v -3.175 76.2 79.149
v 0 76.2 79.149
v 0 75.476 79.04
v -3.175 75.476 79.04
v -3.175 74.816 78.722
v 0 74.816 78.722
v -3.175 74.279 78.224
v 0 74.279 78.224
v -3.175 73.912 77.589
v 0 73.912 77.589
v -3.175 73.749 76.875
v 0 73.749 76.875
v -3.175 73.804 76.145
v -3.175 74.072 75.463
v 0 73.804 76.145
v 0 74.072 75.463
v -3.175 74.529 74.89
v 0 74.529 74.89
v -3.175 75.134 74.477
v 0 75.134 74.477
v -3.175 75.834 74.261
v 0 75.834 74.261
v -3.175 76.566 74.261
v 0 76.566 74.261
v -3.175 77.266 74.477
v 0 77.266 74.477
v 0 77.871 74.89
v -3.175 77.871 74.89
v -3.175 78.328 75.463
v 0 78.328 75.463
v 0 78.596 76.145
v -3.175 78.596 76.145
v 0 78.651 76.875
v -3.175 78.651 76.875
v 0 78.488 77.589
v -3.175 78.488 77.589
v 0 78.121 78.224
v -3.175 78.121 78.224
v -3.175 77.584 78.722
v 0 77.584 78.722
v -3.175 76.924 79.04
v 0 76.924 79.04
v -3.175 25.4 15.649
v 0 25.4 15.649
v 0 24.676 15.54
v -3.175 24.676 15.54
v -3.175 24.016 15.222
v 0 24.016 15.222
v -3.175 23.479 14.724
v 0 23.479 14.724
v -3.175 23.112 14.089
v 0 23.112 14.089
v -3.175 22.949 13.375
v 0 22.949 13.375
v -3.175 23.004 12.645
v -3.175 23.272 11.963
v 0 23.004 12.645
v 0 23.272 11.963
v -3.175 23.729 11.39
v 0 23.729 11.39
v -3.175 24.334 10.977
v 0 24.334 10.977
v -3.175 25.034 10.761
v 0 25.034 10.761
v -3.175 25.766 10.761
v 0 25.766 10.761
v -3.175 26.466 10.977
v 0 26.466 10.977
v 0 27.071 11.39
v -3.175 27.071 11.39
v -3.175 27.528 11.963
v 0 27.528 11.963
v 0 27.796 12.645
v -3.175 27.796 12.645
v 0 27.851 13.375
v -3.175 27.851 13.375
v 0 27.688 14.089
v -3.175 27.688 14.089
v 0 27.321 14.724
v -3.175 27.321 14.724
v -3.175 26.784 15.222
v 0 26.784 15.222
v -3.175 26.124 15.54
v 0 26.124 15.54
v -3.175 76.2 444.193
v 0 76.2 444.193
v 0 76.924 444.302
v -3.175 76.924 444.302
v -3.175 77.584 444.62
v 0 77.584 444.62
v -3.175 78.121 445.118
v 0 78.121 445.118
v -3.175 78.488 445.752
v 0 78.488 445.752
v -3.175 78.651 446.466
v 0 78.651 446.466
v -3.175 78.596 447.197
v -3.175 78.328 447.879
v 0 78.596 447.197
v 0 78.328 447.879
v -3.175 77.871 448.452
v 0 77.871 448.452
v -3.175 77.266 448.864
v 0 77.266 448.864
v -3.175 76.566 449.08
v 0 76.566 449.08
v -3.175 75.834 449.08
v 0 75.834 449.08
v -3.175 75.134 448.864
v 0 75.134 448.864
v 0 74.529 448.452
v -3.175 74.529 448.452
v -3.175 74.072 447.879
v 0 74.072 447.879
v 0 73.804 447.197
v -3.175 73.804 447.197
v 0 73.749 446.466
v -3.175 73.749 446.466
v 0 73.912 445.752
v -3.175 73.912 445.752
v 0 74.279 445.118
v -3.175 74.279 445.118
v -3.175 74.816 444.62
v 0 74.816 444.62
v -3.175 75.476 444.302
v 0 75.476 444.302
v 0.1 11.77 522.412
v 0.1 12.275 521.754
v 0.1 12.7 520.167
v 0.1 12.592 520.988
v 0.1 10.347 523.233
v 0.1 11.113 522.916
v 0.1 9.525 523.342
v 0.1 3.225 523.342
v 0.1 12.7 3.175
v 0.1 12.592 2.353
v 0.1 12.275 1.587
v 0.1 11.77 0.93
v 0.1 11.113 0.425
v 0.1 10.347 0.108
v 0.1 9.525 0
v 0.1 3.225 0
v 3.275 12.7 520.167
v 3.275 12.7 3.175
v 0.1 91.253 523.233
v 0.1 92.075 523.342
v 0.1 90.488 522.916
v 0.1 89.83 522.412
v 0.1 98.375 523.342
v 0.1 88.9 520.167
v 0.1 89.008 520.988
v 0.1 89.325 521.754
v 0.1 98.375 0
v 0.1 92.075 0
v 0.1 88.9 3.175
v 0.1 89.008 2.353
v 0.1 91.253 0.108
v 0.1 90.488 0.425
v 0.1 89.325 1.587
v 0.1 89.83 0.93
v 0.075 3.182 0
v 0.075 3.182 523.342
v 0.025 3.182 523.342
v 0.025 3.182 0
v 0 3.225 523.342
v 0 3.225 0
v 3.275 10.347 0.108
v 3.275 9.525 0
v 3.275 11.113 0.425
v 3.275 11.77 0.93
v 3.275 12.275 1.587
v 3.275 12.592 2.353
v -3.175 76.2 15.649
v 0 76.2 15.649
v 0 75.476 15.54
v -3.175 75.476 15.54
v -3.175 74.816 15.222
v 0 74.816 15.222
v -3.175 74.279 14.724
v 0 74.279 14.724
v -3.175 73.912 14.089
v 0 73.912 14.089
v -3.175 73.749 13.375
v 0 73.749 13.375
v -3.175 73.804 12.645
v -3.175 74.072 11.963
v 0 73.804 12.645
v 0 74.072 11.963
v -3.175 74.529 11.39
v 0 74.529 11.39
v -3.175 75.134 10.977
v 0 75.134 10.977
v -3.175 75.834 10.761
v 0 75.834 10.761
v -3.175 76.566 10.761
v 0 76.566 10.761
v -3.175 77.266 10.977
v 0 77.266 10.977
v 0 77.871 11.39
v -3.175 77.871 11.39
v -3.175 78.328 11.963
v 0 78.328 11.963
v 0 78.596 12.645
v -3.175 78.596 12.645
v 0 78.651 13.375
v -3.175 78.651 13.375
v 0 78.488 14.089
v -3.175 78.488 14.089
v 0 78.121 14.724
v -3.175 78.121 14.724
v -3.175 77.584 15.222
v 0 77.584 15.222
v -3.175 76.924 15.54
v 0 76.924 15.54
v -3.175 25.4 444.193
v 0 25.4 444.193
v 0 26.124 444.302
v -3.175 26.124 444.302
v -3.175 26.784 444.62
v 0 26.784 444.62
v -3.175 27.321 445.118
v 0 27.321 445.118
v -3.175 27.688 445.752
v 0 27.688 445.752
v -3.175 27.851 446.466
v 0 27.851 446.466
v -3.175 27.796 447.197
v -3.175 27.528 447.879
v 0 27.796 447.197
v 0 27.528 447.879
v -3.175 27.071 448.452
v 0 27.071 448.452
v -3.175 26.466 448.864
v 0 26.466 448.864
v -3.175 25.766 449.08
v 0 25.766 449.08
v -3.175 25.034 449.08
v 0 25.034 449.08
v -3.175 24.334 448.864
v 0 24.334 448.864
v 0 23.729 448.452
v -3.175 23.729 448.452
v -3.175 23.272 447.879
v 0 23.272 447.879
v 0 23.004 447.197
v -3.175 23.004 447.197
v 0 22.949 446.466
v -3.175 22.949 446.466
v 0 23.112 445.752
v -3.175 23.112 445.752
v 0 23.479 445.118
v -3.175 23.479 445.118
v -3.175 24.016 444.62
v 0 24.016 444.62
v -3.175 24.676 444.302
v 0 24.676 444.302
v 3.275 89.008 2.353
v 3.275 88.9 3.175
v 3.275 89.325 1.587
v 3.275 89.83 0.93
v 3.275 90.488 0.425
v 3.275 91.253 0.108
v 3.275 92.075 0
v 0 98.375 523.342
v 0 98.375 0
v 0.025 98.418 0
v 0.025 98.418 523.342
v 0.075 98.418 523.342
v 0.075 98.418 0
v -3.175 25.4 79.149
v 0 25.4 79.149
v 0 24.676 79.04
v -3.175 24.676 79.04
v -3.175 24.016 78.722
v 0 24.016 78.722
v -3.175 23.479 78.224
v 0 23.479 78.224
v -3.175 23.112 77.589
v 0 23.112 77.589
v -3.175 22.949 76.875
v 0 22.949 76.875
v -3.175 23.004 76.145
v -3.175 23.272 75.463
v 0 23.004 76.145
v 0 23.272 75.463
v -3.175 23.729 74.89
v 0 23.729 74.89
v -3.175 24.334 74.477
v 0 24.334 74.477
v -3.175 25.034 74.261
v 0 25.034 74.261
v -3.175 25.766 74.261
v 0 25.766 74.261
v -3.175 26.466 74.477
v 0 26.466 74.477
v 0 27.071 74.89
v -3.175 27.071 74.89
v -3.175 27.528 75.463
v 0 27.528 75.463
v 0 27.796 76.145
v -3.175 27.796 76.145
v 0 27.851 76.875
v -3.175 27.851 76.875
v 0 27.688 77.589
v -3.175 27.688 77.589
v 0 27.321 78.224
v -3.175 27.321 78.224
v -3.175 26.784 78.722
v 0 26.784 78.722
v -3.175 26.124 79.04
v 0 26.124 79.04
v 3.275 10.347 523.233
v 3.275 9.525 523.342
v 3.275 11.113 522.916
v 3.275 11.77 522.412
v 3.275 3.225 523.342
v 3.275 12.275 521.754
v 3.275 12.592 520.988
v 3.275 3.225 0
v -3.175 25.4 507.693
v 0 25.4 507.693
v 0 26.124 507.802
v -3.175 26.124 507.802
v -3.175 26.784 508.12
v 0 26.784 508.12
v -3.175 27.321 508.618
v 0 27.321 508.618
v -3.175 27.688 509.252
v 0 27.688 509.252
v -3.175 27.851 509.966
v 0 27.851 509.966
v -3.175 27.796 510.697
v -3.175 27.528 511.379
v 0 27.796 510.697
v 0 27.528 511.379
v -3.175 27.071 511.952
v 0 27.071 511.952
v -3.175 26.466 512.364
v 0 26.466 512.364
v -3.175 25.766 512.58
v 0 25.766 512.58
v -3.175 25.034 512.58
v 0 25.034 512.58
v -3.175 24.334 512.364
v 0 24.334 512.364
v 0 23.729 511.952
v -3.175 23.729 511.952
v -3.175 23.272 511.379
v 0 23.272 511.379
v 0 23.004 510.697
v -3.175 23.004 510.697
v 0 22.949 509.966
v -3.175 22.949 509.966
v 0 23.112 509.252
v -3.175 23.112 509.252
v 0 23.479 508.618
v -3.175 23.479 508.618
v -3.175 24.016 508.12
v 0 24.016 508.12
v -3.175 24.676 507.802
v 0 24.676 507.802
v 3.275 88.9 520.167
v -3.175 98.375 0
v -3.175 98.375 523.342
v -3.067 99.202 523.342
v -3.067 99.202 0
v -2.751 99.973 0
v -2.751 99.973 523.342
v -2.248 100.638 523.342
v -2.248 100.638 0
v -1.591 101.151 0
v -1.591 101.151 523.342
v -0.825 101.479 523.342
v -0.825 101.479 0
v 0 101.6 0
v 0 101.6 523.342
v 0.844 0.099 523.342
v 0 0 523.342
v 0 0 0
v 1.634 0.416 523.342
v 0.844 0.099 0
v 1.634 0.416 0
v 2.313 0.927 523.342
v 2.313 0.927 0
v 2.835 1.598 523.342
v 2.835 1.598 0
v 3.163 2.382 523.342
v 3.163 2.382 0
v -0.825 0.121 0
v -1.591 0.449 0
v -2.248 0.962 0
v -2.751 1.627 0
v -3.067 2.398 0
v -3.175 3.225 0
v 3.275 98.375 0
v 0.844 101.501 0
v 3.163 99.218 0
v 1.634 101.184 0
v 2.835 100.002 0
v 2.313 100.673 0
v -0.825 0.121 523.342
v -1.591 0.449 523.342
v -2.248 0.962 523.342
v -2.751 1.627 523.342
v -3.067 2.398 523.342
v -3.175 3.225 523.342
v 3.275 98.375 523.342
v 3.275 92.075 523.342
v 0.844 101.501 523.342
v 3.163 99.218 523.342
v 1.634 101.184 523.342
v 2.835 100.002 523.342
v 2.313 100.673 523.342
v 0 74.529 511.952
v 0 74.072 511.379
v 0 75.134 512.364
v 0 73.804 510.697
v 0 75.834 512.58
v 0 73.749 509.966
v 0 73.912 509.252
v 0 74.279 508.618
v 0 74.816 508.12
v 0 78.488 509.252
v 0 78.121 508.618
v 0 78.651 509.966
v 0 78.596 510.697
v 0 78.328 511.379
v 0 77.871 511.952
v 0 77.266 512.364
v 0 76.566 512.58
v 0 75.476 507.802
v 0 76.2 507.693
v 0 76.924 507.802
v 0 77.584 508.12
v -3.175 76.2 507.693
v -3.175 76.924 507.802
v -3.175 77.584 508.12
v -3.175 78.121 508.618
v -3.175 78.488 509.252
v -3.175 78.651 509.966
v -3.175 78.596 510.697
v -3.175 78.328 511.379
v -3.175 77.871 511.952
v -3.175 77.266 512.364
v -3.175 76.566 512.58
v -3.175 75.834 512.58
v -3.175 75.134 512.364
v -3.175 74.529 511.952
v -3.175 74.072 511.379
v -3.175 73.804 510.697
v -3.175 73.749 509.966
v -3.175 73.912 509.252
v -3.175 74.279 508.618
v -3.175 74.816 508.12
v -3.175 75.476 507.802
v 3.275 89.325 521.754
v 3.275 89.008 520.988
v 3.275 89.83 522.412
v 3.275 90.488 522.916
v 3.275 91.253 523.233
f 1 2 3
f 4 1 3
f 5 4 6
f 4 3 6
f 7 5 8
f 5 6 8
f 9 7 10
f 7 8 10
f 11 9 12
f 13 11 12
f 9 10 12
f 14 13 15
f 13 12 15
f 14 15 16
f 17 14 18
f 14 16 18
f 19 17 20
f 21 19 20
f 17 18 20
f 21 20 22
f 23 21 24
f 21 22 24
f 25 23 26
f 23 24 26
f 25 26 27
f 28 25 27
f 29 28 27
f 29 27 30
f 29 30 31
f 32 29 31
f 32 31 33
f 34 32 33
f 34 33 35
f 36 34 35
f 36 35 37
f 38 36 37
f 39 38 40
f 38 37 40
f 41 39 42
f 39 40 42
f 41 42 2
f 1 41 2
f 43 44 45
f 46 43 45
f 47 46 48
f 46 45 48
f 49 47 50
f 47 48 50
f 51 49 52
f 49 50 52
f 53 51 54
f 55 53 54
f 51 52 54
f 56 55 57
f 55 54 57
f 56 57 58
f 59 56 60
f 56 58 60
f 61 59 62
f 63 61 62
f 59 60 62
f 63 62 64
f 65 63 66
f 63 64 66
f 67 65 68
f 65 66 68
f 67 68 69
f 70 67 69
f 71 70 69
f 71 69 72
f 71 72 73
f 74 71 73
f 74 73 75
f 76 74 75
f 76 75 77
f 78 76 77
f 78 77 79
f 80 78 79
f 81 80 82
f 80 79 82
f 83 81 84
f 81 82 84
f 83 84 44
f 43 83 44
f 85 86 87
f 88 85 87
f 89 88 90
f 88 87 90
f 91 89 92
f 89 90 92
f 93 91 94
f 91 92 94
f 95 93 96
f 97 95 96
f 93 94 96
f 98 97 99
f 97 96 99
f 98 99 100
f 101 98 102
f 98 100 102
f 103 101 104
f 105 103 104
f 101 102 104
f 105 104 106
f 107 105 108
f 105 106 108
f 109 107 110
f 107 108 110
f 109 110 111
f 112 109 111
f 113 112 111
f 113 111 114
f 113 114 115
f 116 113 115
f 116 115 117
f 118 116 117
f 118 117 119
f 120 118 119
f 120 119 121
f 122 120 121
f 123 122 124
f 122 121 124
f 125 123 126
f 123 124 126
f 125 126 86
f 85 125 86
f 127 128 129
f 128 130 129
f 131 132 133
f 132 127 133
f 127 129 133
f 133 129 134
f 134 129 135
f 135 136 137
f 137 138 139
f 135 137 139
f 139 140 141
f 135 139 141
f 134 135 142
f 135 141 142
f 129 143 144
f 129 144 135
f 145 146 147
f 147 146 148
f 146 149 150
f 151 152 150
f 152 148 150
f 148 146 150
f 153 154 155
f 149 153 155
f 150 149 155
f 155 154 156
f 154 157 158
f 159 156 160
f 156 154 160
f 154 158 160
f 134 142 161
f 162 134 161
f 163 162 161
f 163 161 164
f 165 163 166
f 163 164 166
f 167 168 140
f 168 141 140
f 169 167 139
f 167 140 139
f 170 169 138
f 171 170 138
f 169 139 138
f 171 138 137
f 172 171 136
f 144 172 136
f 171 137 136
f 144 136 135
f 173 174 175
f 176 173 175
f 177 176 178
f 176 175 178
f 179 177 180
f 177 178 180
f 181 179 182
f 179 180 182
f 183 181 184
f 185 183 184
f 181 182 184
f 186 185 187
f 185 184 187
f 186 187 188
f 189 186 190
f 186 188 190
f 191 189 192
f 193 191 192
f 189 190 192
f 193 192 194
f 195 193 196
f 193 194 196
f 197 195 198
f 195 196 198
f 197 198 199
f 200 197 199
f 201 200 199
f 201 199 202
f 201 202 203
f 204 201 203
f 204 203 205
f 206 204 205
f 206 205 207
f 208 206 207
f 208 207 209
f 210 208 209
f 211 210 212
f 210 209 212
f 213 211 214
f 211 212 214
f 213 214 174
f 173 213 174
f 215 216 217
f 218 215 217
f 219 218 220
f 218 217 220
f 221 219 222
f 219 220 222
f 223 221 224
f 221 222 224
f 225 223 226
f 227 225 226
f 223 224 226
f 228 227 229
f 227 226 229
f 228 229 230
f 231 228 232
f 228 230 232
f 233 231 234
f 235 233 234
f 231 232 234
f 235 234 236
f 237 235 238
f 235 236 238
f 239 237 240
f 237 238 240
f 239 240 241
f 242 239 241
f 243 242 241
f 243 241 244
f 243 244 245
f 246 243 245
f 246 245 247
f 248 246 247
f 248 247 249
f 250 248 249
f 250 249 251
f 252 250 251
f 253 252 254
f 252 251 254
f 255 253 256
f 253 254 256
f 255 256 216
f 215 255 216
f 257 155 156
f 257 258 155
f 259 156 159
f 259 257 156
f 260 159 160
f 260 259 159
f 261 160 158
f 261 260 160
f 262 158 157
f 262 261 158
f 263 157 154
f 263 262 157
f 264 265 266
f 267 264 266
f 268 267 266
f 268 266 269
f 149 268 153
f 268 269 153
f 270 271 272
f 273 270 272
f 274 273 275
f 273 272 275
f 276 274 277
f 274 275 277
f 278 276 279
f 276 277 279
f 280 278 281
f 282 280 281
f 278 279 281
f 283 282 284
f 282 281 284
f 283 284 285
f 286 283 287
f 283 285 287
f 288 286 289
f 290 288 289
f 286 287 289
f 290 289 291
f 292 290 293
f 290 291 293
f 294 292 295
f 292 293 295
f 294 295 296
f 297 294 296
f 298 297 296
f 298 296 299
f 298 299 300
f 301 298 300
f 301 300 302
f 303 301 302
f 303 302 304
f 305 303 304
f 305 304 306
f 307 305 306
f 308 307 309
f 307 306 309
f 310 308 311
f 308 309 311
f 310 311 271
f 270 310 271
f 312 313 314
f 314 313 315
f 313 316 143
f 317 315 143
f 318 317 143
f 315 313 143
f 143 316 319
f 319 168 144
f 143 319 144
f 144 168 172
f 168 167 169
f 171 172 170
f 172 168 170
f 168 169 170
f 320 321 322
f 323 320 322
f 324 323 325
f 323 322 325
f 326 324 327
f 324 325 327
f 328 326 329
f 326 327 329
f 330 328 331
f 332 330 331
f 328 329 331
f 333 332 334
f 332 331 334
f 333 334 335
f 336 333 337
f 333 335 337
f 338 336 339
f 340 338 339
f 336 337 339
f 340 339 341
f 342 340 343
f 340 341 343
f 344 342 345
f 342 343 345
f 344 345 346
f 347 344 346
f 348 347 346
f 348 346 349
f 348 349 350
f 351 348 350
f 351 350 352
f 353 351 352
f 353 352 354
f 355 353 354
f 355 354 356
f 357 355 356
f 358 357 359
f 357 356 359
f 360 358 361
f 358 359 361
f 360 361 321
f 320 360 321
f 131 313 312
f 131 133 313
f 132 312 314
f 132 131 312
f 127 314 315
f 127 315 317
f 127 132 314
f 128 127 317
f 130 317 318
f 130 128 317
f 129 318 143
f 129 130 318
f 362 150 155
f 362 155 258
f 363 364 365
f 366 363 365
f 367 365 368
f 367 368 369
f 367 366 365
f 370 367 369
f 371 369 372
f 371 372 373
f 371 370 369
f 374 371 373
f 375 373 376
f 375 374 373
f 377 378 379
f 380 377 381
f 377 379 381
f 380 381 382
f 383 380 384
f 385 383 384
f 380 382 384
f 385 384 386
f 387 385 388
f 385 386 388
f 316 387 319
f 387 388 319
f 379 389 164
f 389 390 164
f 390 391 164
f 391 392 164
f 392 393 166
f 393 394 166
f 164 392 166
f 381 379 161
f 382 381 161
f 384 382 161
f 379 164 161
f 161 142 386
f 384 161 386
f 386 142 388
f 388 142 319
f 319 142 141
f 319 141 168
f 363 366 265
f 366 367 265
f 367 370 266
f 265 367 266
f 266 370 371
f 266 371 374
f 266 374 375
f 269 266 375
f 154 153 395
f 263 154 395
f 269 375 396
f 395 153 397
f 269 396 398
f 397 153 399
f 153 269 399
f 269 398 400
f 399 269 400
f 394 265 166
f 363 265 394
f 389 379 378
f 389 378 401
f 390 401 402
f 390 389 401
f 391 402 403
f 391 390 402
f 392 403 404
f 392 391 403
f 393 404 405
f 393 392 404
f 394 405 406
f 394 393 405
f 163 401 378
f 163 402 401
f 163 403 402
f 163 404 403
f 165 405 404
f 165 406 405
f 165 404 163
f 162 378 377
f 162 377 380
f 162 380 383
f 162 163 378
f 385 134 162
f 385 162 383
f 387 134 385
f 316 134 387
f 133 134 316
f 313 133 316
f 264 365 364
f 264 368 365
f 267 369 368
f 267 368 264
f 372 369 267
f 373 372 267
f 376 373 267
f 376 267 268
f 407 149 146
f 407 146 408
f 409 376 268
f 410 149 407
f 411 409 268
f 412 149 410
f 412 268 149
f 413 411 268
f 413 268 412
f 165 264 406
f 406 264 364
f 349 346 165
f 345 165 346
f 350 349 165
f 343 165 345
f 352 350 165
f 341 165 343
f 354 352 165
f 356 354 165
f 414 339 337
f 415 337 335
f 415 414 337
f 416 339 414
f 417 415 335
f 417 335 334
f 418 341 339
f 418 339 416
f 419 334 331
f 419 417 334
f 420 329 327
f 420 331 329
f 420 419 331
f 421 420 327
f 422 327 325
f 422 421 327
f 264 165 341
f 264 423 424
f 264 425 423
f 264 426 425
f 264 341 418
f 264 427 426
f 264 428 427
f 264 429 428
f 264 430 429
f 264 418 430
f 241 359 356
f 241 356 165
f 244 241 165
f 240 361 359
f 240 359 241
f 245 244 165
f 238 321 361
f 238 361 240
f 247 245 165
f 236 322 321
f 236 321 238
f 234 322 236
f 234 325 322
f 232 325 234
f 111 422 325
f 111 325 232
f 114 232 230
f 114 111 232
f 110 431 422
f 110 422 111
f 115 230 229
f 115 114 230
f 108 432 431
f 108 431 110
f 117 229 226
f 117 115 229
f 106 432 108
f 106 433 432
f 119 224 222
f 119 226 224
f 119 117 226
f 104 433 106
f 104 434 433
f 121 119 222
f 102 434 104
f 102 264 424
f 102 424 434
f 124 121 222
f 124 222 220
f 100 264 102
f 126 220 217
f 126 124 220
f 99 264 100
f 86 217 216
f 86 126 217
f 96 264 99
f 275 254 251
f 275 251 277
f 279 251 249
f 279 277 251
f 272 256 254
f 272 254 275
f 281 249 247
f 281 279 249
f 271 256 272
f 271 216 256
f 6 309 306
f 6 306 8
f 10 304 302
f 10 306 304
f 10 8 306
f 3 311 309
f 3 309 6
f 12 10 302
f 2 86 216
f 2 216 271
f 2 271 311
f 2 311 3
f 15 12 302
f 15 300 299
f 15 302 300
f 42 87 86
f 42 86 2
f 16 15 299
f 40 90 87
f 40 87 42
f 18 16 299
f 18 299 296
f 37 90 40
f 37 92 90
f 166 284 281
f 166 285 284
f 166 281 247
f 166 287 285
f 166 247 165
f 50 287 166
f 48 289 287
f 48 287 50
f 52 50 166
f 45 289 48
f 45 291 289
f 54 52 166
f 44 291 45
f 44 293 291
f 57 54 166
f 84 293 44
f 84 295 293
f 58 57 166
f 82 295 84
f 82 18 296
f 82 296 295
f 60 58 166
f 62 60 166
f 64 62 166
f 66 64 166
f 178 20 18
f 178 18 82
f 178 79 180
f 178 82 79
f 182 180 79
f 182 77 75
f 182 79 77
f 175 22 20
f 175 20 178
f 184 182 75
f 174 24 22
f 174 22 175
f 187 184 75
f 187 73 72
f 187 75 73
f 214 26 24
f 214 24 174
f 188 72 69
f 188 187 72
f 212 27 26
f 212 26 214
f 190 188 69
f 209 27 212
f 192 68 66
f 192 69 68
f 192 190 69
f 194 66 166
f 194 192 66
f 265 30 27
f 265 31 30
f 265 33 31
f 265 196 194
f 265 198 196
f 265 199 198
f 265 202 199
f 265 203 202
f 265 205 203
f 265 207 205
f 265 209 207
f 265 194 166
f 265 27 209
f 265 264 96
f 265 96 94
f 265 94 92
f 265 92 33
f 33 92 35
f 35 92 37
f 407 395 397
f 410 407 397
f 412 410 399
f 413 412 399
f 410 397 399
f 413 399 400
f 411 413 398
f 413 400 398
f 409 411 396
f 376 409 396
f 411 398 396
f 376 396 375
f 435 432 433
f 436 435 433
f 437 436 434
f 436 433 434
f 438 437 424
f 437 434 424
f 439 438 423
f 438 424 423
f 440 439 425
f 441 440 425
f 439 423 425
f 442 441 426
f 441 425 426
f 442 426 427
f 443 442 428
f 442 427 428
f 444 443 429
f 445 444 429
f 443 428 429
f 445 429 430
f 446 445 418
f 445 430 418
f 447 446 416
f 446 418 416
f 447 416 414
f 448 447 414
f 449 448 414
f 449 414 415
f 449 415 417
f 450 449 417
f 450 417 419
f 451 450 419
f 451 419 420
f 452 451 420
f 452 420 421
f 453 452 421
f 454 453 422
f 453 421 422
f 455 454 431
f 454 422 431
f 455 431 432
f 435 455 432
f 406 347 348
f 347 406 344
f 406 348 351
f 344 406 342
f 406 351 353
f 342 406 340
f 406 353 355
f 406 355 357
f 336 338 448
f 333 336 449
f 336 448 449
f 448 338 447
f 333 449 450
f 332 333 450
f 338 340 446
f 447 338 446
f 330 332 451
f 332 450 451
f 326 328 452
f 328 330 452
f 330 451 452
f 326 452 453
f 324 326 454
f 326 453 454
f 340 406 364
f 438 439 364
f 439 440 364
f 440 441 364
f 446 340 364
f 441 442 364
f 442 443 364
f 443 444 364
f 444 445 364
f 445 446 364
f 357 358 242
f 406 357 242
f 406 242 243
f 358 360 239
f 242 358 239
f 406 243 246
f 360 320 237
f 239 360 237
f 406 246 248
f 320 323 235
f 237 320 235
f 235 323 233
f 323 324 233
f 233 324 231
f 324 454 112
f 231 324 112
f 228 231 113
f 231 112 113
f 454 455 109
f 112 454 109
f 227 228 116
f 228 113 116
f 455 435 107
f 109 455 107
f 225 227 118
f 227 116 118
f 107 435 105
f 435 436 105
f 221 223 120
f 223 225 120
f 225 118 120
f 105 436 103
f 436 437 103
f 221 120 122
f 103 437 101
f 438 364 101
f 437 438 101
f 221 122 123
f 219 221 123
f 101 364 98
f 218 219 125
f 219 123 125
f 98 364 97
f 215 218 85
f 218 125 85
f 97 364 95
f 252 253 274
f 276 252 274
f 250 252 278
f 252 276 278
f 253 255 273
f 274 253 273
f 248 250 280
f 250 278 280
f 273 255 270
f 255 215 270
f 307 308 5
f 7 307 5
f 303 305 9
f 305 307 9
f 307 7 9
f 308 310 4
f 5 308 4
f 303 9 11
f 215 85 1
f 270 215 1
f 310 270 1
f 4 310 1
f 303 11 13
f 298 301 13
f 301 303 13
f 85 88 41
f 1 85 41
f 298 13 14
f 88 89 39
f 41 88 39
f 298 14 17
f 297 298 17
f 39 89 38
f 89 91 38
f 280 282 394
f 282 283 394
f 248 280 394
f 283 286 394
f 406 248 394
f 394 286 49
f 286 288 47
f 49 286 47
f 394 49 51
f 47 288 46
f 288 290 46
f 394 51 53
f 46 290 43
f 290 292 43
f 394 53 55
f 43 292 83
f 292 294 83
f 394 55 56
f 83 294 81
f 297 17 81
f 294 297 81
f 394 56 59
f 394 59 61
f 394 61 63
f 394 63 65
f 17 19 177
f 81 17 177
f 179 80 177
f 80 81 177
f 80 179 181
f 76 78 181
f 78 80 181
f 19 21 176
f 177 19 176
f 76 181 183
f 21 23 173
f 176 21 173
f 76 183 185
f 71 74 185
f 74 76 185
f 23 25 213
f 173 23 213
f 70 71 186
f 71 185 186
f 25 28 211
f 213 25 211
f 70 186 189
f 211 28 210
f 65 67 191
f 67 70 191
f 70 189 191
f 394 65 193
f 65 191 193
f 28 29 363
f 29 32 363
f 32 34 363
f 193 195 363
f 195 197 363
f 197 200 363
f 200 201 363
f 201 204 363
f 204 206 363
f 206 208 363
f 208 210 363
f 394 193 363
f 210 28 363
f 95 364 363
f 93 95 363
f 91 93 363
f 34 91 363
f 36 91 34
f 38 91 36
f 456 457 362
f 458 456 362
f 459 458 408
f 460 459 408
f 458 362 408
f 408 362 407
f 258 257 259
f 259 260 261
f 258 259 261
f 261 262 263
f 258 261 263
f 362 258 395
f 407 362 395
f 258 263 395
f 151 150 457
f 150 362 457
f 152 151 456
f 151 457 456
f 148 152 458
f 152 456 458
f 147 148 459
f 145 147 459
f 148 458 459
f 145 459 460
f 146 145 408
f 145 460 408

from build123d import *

# Parameters (mm, degrees)
SKETCH1_W          = 523.3416
SKETCH1_H          = 101.6
SKETCH1_R          = 2.45745
BASE_FLANGE1_DEPTH = 3.175
HEM1_DEPTH         = 523.3416
HEM1_2_DEPTH       = 523.3416
FILLET1_R          = 3.175


# Read off the part's stored shape, not the designer's step: Hem1
# Sheet-metal steps are written as plain solids
with BuildPart() as part:
    # Sketch1 → Base-Flange1 (new body)
    with BuildSketch(Plane(origin=(0, 0, 0), x_dir=(0, 0, -1), z_dir=(1, 0, 0))):
        with Locations((-261.6708, 50.8)):
            Rectangle(SKETCH1_W, SKETCH1_H)
        with Locations((-510.15011, 76.2)):
            Circle(SKETCH1_R, mode=Mode.SUBTRACT)
        with Locations((-446.65011, 76.2)):
            Circle(SKETCH1_R, mode=Mode.SUBTRACT)
        with Locations((-446.65011, 25.4)):
            Circle(SKETCH1_R, mode=Mode.SUBTRACT)
        with Locations((-510.15011, 25.4)):
            Circle(SKETCH1_R, mode=Mode.SUBTRACT)
        with Locations(Location((-76.69149, 76.2, 0), (0, 0, 180))):
            Circle(SKETCH1_R, mode=Mode.SUBTRACT)
        with Locations(Location((-76.69149, 25.4, 0), (0, 0, 180))):
            Circle(SKETCH1_R, mode=Mode.SUBTRACT)
        with Locations(Location((-13.19149, 25.4, 0), (0, 0, 180))):
            Circle(SKETCH1_R, mode=Mode.SUBTRACT)
        with Locations(Location((-13.19149, 76.2, 0), (0, 0, 180))):
            Circle(SKETCH1_R, mode=Mode.SUBTRACT)
    extrude(amount=-BASE_FLANGE1_DEPTH)

    # Hem1 outline → Hem1 (cut)
    with BuildSketch(Plane.XY):
        with BuildLine():
            ThreePointArc((-3.175, 98.375), (-2.248029047, 100.637672645), (0, 101.59961238))
            Line((0, 101.59961238), (0, 101.6))
            Line((0, 101.6), (-3.175, 101.6))
            Line((-3.175, 101.6), (-3.175, 98.375))
        make_face()
        with BuildLine():
            ThreePointArc((0, 0.00038762), (-2.248029047, 0.962327355), (-3.175, 3.225))
            Line((-3.175, 3.225), (-3.175, 0))
            Line((-3.175, 0), (0, 0))
            Line((0, 0), (0, 0.00038762))
        make_face()
    extrude(amount=HEM1_DEPTH, mode=Mode.SUBTRACT)

    # Hem1 2 outline → Hem1 2 (add)
    with BuildSketch(Plane.XY):
        with BuildLine():
            Line((0.1, 88.9), (3.275, 88.9))
            Line((3.275, 88.9), (3.275, 98.375))
            ThreePointArc((3.275, 98.375), (2.312672645, 100.673029047), (0, 101.59961238))
            Line((0, 101.59961238), (0, 98.375))
            ThreePointArc((0, 98.375), (0.05, 98.425), (0.1, 98.375))
            Line((0.1, 98.375), (0.1, 88.9))
        make_face()
        with BuildLine():
            ThreePointArc((0.1, 3.225), (0.05, 3.175), (0, 3.225))
            Line((0, 3.225), (0, 0.00038762))
            ThreePointArc((0, 0.00038762), (2.312672645, 0.926970953), (3.275, 3.225))
            Line((3.275, 3.225), (3.275, 12.7))
            Line((3.275, 12.7), (0.1, 12.7))
            Line((0.1, 12.7), (0.1, 3.225))
        make_face()
    extrude(amount=HEM1_2_DEPTH)

    # Fillet1
    fillet1_edges = [part.edges().sort_by_distance(p)[0] for p in [
        (1.6875, 88.9, 523.3416),
        (1.6875, 88.9, 0),
        (1.6875, 12.7, 0),
        (1.6875, 12.7, 523.3416),
    ]]
    fillet(fillet1_edges, radius=FILLET1_R)


solid = part.part
